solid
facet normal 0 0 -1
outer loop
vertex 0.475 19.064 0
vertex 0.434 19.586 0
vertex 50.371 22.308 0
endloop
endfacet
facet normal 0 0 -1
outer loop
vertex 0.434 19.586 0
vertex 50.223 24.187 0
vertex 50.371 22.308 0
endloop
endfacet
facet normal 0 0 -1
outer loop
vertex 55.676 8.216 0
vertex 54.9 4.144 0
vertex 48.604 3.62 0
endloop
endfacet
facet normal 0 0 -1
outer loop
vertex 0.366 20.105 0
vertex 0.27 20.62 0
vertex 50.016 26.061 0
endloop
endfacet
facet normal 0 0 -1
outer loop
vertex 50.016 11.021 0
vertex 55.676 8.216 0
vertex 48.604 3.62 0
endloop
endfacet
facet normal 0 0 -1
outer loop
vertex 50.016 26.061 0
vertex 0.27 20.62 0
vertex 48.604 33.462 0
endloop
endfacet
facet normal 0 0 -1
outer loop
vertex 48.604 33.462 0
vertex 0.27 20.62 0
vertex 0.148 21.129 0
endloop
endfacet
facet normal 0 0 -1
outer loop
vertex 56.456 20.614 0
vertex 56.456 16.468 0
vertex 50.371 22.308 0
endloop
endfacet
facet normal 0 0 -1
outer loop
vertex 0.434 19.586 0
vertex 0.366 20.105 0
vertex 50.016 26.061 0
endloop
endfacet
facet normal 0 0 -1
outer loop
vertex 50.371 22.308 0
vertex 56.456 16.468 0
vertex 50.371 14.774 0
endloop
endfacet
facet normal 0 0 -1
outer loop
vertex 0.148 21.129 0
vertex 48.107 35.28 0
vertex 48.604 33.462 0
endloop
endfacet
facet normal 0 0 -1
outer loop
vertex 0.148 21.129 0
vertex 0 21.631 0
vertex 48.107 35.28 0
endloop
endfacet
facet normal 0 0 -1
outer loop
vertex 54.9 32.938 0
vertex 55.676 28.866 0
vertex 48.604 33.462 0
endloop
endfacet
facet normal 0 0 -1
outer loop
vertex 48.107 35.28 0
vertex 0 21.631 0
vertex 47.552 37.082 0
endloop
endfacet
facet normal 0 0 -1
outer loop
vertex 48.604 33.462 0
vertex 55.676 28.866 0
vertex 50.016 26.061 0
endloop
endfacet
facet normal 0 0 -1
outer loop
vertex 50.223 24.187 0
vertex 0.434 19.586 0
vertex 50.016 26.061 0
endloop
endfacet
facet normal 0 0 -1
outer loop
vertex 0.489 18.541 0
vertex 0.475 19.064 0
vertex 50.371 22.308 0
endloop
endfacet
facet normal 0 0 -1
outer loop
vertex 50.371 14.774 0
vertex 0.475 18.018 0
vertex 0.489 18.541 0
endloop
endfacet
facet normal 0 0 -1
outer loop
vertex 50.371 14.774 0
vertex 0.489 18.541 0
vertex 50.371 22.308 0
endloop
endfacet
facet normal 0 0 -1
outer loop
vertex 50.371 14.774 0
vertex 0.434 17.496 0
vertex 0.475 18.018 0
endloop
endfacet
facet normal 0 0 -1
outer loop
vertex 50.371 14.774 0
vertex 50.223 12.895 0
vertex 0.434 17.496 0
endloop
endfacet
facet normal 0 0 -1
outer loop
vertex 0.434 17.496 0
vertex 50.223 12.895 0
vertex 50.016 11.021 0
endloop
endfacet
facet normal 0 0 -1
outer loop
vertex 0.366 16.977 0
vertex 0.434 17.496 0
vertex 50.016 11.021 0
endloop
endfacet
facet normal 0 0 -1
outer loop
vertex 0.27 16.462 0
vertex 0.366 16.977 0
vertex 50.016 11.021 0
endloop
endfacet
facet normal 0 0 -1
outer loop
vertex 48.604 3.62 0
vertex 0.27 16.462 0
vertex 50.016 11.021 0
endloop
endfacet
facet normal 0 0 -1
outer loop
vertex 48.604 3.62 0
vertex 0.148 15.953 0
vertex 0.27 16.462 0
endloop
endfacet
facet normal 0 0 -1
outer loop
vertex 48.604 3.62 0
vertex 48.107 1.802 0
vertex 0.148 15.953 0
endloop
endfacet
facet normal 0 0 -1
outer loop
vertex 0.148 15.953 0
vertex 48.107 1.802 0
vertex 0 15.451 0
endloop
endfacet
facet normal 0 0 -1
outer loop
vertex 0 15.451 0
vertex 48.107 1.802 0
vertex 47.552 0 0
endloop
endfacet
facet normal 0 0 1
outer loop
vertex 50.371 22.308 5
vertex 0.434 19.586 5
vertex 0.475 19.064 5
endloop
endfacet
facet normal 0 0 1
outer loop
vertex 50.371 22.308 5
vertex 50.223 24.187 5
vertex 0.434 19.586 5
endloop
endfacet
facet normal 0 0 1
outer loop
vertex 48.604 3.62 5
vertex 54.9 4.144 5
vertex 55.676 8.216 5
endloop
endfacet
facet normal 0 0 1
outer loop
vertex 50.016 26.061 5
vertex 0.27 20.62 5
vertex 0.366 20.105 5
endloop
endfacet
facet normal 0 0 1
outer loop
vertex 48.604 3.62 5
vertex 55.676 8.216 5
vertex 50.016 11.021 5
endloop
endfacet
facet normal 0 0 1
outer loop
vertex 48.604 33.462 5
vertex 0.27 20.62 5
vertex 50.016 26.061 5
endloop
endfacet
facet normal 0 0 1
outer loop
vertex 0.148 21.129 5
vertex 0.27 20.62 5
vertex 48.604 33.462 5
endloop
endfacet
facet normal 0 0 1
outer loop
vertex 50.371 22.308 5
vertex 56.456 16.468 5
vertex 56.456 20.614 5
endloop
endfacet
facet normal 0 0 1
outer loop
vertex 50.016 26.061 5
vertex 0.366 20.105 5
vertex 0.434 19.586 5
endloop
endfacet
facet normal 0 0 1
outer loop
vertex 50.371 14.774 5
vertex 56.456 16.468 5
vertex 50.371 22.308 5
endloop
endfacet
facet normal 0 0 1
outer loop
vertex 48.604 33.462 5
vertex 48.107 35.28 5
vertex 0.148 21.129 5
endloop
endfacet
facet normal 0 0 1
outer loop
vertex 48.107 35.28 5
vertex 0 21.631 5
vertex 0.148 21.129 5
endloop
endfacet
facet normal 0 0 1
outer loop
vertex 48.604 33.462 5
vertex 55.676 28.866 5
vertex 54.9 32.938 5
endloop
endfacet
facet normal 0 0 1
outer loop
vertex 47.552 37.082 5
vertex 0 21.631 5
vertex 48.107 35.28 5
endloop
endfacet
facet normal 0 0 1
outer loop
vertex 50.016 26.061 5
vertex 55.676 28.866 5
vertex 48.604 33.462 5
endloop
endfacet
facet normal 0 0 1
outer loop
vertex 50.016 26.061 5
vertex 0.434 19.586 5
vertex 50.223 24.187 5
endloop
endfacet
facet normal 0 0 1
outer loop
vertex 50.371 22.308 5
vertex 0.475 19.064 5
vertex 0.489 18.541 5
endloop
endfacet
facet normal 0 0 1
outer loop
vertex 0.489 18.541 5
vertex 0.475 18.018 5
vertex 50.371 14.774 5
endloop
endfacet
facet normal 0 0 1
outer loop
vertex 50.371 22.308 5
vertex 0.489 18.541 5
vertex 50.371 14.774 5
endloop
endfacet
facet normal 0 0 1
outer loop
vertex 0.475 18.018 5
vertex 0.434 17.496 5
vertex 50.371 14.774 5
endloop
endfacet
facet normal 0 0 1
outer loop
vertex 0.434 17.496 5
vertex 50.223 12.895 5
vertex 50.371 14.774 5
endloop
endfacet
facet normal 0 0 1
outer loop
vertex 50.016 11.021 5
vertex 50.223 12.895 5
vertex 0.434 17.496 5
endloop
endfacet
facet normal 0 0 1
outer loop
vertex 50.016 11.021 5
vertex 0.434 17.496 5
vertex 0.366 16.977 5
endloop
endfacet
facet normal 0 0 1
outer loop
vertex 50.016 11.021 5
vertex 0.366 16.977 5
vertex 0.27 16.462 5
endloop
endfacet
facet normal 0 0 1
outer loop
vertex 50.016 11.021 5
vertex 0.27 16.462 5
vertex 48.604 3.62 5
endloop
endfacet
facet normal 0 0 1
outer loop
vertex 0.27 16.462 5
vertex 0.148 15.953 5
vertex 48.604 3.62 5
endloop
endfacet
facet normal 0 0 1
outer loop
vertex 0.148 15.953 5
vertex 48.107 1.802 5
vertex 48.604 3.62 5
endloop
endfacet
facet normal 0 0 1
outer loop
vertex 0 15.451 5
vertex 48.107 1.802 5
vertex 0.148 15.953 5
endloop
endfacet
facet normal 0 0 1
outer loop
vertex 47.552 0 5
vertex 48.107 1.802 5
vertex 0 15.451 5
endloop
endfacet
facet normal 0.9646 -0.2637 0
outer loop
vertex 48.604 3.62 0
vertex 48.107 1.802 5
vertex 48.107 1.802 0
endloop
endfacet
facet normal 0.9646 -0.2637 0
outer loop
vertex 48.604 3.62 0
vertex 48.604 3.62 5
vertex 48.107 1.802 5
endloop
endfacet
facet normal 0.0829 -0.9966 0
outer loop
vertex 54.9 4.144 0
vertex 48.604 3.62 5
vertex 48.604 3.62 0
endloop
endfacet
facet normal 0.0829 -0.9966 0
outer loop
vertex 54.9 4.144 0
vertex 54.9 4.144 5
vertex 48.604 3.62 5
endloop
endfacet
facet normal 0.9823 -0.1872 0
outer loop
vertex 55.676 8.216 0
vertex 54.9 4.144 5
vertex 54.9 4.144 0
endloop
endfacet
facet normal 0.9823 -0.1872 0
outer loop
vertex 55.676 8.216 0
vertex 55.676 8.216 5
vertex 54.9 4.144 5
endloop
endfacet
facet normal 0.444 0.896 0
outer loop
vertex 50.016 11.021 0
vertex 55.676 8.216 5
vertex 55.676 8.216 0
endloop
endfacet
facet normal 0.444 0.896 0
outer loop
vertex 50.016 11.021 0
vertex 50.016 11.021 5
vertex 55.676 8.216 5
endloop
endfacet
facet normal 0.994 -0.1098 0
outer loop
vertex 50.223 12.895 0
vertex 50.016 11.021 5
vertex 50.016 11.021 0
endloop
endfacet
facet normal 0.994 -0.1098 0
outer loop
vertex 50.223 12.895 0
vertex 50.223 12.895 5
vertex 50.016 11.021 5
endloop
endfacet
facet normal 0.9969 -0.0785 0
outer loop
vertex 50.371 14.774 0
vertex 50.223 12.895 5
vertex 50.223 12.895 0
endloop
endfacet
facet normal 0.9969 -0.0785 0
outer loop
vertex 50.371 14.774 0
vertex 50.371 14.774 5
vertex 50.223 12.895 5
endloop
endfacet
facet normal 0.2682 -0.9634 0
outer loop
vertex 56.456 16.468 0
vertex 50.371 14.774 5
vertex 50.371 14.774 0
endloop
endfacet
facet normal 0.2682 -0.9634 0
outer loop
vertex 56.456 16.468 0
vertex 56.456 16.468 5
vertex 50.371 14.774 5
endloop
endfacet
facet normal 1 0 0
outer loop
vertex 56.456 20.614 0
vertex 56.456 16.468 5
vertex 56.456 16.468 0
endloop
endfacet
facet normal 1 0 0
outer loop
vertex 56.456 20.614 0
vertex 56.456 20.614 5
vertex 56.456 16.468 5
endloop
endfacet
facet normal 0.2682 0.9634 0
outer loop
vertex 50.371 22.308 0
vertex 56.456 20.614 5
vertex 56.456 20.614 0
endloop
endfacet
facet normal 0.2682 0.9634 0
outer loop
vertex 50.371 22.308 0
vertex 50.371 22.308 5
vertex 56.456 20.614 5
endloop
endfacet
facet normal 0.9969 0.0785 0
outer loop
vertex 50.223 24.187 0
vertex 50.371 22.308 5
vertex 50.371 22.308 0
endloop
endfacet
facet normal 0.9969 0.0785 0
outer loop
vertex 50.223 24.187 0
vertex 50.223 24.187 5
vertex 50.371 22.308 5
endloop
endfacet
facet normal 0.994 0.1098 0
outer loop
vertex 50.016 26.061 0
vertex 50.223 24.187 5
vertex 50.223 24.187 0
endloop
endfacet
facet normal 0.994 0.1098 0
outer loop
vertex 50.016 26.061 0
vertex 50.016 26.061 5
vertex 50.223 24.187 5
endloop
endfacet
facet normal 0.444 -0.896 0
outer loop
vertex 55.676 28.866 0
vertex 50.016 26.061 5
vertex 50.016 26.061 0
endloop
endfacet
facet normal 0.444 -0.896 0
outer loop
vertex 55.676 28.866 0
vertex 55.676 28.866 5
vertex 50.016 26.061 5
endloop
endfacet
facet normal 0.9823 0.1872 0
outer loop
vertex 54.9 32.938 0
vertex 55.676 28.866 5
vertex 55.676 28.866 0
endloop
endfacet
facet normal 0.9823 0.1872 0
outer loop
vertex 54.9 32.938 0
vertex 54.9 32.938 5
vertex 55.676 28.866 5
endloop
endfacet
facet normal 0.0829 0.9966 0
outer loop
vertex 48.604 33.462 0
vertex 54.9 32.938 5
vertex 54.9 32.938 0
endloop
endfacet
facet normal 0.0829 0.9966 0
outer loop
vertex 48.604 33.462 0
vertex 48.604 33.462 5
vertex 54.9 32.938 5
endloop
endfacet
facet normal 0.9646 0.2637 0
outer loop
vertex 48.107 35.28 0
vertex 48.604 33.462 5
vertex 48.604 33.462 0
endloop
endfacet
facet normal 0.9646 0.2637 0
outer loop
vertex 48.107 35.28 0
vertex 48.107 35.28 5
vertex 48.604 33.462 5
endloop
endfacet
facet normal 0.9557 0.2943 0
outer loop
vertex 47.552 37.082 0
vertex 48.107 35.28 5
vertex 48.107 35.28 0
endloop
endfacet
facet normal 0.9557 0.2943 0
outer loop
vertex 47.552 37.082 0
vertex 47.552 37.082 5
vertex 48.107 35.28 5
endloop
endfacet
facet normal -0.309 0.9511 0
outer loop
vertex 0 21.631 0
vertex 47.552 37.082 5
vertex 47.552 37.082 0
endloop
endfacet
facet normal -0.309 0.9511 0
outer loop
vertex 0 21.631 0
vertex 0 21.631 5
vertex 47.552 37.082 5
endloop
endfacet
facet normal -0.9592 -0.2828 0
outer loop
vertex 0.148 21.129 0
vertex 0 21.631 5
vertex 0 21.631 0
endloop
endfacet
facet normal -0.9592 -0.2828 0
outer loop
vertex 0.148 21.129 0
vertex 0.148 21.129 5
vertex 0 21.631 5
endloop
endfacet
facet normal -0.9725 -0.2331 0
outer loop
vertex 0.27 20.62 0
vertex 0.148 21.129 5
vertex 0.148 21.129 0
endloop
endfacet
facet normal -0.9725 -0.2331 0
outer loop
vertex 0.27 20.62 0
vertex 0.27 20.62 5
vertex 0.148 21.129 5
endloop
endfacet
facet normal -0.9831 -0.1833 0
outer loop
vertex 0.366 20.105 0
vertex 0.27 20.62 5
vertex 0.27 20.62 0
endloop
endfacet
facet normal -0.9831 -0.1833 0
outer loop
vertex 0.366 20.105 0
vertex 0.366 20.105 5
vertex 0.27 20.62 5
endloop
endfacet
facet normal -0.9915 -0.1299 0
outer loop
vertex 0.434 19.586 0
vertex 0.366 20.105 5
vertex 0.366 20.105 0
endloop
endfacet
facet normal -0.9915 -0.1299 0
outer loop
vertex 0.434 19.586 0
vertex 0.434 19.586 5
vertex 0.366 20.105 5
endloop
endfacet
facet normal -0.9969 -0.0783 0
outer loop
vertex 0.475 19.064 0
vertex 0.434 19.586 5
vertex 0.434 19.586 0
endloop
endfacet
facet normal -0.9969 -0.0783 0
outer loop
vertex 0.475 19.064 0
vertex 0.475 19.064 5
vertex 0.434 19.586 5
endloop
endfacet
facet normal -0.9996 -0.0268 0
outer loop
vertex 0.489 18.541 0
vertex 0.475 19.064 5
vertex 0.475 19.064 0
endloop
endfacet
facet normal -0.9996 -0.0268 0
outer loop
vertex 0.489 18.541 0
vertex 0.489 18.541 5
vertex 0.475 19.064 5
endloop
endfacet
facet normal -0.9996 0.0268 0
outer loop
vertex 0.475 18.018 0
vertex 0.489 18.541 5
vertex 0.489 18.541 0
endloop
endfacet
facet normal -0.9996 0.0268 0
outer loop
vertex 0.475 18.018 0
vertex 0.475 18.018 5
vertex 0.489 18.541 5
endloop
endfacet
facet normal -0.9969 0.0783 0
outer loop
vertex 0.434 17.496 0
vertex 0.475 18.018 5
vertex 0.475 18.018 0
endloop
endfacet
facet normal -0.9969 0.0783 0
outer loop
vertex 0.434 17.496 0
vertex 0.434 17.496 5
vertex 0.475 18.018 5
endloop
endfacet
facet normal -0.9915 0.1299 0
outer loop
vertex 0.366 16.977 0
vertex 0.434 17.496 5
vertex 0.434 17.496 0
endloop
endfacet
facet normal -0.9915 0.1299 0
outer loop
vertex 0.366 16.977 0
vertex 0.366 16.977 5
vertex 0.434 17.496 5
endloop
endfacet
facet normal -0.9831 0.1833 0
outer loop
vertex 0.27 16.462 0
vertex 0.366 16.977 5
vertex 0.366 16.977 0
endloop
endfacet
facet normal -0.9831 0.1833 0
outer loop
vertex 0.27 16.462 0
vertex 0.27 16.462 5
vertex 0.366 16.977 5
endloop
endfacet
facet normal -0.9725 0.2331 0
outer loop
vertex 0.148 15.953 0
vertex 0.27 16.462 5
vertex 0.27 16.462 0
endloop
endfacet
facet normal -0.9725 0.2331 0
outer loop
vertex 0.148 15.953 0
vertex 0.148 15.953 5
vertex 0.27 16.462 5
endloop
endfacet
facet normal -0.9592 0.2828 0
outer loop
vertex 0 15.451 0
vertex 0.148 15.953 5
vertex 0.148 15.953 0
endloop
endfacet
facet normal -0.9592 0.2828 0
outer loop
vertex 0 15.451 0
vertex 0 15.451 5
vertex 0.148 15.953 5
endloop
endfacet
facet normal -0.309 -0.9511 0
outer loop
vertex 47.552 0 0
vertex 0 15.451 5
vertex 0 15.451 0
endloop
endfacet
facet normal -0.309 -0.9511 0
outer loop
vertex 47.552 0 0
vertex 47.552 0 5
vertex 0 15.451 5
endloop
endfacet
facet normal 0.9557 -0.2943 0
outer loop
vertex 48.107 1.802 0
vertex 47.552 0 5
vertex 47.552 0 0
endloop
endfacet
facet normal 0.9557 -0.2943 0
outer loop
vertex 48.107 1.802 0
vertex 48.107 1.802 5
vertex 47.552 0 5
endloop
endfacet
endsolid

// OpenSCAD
$fn = 32;

// ----------------------------------------------------------------------
// Gear sector: 3 teeth on 36 degrees
// ----------------------------------------------------------------------

// --- parameters (mm) ---
sector_angle = 36;        // sector angle, degrees
root_r = 60;              // root circle radius
tooth_h = 6;              // tooth height over the root circle
teeth = 3;                // number of teeth on the sector
hub_r = 10;               // hub bore radius
plate_t = 5;              // sector thickness, Z
arc_step = 3;             // sampling step of the root/hub arcs, degrees
fit_tol = 0.1;            // declared fit tolerance (prompt contract)
free_tol = 0.3;           // declared free tolerance (prompt contract)

tip_r = root_r + tooth_h;  // tip circle radius

profile = [[47.552, 0], [48.107, 1.802], [48.604, 3.62], [54.9, 4.144], [55.676, 8.216], [50.016, 11.021], [50.223, 12.895], [50.371, 14.774], [56.456, 16.468], [56.456, 20.614], [50.371, 22.308], [50.223, 24.187], [50.016, 26.061], [55.676, 28.866], [54.9, 32.938], [48.604, 33.462], [48.107, 35.28], [47.552, 37.082], [0, 21.631], [0.148, 21.129], [0.27, 20.62], [0.366, 20.105], [0.434, 19.586], [0.475, 19.064], [0.489, 18.541], [0.475, 18.018], [0.434, 17.496], [0.366, 16.977], [0.27, 16.462], [0.148, 15.953], [0, 15.451]];  // primary outline, 31 points, counter clockwise

// --- the one profile operation ---
linear_extrude(height = plate_t) polygon(points = profile);
